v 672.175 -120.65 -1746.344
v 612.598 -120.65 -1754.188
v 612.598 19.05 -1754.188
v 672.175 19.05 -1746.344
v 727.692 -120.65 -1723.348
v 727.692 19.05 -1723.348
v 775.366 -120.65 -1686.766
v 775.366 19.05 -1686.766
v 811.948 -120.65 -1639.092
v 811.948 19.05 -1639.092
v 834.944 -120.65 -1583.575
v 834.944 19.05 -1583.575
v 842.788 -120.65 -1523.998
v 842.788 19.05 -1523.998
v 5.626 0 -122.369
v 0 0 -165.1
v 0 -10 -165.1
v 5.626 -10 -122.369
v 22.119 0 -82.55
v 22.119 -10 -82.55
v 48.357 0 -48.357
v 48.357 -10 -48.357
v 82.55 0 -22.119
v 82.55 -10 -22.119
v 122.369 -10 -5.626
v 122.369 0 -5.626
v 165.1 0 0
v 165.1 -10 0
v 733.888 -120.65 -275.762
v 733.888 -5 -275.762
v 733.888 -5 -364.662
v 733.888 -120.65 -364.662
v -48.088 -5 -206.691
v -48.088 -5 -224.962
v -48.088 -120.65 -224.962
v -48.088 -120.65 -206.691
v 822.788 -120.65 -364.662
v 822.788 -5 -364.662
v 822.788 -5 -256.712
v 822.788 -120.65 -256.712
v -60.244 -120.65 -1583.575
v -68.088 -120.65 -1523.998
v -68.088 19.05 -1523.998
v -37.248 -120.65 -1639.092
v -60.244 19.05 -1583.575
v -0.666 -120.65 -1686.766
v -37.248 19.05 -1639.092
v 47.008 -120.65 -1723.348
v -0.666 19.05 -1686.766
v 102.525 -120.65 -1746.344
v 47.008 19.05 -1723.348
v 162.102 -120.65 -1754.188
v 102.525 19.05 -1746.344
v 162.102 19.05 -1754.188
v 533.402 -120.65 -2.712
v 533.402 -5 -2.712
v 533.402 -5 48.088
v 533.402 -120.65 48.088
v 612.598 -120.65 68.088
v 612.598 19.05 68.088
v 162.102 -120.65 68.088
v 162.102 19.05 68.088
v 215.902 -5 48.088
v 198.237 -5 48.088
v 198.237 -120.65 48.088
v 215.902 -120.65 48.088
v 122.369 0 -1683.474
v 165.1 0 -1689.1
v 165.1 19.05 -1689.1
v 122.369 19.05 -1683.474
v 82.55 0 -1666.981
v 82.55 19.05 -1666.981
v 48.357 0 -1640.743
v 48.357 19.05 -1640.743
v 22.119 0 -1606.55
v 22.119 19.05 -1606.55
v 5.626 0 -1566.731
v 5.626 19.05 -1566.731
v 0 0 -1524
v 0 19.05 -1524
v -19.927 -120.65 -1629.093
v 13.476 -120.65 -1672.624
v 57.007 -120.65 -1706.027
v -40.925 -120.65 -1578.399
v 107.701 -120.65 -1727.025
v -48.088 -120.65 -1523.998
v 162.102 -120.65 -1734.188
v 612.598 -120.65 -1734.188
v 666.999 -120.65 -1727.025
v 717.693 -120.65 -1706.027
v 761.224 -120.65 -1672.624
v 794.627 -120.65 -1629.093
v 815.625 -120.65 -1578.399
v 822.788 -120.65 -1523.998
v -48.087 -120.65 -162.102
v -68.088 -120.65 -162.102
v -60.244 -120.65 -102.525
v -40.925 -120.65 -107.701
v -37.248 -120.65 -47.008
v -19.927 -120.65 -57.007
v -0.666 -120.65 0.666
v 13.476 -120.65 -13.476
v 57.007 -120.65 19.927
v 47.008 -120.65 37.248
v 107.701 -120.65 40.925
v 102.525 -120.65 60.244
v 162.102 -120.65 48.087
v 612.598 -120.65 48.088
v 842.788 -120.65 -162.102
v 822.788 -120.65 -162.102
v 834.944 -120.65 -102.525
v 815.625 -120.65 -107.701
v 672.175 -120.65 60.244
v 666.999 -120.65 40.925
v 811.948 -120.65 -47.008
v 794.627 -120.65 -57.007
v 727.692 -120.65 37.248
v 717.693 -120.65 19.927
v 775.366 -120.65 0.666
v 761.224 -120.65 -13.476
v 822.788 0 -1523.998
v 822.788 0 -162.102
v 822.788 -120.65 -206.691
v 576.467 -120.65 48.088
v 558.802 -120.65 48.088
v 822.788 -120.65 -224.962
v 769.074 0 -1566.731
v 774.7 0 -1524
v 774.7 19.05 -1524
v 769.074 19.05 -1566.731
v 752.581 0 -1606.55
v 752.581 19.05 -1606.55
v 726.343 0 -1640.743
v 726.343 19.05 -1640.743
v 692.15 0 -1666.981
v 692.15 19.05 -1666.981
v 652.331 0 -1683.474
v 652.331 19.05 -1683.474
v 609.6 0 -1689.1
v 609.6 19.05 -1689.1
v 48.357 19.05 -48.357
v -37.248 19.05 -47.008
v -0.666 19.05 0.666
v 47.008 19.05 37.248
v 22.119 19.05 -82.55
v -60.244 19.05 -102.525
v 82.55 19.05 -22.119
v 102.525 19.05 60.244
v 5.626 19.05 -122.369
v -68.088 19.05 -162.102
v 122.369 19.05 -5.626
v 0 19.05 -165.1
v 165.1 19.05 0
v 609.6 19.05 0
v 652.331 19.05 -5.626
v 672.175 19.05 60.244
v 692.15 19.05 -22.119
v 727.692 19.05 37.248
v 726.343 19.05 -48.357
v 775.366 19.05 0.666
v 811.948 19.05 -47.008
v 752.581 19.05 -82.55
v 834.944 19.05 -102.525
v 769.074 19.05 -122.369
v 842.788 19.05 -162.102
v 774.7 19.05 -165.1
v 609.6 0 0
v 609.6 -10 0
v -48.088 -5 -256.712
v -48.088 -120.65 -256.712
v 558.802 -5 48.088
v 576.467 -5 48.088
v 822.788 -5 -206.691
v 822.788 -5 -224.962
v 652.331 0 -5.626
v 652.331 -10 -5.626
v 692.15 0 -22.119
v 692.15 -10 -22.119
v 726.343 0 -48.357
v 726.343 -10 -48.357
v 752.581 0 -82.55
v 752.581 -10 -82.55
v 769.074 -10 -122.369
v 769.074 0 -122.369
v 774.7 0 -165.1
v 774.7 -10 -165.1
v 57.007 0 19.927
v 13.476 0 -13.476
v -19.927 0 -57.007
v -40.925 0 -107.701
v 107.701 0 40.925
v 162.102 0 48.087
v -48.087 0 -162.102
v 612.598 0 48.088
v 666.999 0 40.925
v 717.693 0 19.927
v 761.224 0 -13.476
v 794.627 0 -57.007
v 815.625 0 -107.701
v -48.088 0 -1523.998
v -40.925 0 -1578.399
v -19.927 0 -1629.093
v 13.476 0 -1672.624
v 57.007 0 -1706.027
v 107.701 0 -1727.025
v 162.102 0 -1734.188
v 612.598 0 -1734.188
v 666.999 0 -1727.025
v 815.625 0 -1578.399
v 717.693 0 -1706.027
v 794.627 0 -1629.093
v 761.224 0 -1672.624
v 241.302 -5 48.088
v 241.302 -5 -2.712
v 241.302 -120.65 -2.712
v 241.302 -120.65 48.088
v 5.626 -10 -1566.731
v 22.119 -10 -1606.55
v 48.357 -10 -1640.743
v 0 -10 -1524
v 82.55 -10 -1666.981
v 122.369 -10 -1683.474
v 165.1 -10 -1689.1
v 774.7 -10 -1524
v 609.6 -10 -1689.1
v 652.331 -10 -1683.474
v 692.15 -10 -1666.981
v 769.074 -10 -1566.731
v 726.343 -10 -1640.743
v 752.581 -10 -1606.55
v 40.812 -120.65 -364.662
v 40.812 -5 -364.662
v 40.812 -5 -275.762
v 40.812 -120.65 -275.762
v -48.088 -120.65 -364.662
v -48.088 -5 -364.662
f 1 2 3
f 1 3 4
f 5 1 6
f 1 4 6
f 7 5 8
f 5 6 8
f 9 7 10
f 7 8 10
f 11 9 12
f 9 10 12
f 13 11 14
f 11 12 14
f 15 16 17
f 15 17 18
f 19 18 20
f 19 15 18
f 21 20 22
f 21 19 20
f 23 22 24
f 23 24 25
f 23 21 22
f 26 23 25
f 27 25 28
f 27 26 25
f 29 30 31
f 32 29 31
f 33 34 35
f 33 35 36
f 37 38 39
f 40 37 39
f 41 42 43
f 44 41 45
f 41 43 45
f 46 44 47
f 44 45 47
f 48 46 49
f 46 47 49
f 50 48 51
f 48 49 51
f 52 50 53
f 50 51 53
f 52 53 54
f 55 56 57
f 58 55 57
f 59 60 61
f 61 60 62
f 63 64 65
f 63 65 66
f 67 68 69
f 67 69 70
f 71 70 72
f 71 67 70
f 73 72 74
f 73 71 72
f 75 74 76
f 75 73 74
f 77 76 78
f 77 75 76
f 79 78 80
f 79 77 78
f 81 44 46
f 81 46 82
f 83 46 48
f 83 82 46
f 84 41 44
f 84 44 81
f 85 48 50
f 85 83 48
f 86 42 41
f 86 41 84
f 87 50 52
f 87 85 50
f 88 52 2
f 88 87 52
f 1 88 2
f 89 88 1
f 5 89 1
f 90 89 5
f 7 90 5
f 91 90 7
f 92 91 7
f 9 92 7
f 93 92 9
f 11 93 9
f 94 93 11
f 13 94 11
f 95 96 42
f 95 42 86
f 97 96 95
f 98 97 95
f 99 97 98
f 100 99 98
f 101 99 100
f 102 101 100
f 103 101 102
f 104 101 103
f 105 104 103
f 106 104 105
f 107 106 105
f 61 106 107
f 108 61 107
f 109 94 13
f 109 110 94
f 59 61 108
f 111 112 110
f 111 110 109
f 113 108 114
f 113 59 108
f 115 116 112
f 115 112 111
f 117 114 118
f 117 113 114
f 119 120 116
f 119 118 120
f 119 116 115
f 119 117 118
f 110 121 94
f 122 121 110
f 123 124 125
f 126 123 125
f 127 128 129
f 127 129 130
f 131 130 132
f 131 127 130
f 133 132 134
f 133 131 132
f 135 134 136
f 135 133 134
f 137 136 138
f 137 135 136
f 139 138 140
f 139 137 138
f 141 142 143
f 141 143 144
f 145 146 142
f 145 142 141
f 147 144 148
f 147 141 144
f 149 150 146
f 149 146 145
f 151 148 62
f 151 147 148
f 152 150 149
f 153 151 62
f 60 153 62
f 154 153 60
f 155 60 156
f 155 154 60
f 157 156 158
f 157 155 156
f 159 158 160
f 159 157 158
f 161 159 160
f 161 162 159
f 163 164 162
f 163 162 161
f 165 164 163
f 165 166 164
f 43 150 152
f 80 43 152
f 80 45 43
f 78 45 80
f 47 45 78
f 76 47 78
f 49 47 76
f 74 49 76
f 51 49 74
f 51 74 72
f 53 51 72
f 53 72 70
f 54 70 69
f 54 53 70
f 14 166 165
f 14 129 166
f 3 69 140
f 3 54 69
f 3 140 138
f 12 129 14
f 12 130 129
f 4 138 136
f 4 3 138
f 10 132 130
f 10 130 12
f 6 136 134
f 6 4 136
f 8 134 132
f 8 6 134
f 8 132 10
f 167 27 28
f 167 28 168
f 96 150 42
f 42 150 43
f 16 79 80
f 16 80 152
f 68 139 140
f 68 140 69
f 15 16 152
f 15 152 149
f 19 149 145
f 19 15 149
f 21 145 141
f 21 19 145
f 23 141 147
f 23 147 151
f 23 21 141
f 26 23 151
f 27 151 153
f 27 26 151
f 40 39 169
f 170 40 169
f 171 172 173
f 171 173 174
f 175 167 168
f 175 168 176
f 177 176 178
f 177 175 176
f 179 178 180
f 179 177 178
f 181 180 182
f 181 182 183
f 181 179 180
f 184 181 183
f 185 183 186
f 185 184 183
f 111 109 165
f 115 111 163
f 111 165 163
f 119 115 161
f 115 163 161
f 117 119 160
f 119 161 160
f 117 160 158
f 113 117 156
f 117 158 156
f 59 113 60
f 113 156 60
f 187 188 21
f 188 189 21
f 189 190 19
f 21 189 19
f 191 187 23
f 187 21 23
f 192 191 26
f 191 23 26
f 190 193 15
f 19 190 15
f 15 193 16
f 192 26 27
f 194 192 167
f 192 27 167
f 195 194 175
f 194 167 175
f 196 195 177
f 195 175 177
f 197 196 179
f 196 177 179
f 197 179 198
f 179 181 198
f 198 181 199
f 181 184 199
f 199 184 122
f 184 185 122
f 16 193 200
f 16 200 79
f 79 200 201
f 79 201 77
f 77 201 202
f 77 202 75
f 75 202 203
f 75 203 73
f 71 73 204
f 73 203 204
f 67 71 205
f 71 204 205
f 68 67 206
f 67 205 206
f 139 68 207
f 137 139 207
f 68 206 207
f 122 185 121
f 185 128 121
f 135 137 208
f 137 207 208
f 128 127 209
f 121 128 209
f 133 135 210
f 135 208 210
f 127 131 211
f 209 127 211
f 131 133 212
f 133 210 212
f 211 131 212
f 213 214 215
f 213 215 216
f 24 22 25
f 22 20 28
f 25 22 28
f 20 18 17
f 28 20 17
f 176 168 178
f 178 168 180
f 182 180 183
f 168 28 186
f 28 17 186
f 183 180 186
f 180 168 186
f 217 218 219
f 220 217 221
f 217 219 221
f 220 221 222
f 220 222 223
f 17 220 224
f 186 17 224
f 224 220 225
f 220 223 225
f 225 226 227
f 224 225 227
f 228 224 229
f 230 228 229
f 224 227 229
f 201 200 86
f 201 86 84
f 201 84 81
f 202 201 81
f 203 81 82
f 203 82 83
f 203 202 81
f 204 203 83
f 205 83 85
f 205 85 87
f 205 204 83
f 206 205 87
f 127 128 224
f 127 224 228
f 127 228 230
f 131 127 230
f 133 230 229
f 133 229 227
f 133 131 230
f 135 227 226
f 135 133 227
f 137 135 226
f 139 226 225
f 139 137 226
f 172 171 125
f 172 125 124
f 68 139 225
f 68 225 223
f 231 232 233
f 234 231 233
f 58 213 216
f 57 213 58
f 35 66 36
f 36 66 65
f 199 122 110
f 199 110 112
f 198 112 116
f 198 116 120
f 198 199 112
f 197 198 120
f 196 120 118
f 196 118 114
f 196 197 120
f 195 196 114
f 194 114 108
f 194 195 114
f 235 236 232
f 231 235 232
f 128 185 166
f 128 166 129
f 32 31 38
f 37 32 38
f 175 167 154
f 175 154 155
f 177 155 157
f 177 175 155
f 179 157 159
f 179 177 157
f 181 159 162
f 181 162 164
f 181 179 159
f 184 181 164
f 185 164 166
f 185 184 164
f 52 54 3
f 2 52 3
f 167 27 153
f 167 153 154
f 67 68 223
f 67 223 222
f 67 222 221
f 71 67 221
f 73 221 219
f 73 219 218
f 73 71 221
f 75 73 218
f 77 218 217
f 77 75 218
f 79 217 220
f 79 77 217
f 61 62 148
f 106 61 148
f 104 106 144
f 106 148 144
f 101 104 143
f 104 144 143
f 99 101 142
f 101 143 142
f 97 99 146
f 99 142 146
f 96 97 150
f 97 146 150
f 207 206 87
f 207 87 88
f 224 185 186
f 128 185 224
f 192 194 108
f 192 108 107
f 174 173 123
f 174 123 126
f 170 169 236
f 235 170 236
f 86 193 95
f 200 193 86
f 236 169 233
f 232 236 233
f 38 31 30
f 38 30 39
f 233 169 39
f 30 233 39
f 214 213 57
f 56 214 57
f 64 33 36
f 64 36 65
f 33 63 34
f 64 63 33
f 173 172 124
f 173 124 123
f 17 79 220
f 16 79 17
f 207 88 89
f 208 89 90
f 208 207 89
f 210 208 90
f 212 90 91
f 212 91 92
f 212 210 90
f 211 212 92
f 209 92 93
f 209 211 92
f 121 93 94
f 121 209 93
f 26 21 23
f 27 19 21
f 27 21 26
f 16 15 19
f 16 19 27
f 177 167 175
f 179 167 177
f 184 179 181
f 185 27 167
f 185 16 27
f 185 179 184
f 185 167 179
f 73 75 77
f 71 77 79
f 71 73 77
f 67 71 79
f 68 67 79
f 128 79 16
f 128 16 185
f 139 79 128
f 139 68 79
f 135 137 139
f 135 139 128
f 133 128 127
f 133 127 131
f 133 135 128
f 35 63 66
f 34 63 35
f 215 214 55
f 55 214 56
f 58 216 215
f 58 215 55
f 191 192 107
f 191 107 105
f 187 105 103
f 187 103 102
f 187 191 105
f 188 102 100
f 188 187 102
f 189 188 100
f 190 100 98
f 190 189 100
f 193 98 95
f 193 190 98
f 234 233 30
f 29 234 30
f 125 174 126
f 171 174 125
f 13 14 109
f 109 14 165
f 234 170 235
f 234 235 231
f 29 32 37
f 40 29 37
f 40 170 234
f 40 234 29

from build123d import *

# Parameters (mm, degrees)
BOSS_EXTRUDE2_DEPTH   = 10
BOSS_EXTRUDE3_DEPTH   = 19.05
BOSS_EXTRUDE4_DEPTH   = 120.65
BOSS_EXTRUDE7_START   = 5
SKETCH4_W             = 292.1
SKETCH4_H             = 50.8
BOSS_EXTRUDE7_DEPTH   = 115.65
BOSS_EXTRUDE7_2_DEPTH = 115.65
BOSS_EXTRUDE7_3_DEPTH = 115.65
BOSS_EXTRUDE7_4_DEPTH = 115.65


with BuildPart() as part:
    # Sketch1 → Boss-Extrude2 (new body)
    with BuildSketch(Plane(origin=(0, 0, 0), x_dir=(1, 0, 0), z_dir=(0, 1, 0))):
        with BuildLine():
            Line((165.1, 0), (609.6, 0))
            ThreePointArc((609.6, 0), (726.343329574, 48.356670426), (774.7, 165.1))
            Line((774.7, 165.1), (774.7, 1524))
            ThreePointArc((774.7, 1524), (726.343329574, 1640.743329574), (609.6, 1689.1))
            Line((609.6, 1689.1), (165.1, 1689.1))
            ThreePointArc((165.1, 1689.1), (48.356670426, 1640.743329574), (0, 1524))
            Line((0, 1524), (0, 165.1))
            ThreePointArc((0, 165.1), (48.356670426, 48.356670426), (165.1, 0))
        make_face()
    extrude(amount=-BOSS_EXTRUDE2_DEPTH)


with BuildPart() as body_2:
    # Sketch2 → Boss-Extrude3 (new body)
    with BuildSketch(Plane(origin=(0, 0, 0), x_dir=(1, 0, 0), z_dir=(0, 1, 0))):
        with BuildLine():
            Line((162.1025, -68.0875), (612.5975, -68.0875))
            ThreePointArc((612.5975, -68.0875), (775.366409961, -0.666409961), (842.7875, 162.1025))
            Line((842.7875, 162.1025), (842.7875, 1523.9975))
            ThreePointArc((842.7875, 1523.9975), (775.366409961, 1686.766409961), (612.5975, 1754.1875))
            Line((612.5975, 1754.1875), (162.1025, 1754.1875))
            ThreePointArc((162.1025, 1754.1875), (-0.666409961, 1686.766409961), (-68.0875, 1523.9975))
            Line((-68.0875, 1523.9975), (-68.0875, 162.1025))
            ThreePointArc((-68.0875, 162.1025), (-0.666409961, -0.666409961), (162.1025, -68.0875))
        make_face()
        with BuildLine():
            Line((165.1, 0), (609.6, 0))
            ThreePointArc((609.6, 0), (726.343329574, 48.356670426), (774.7, 165.1))
            Line((774.7, 165.1), (774.7, 1524))
            ThreePointArc((774.7, 1524), (726.343329574, 1640.743329574), (609.6, 1689.1))
            Line((609.6, 1689.1), (165.1, 1689.1))
            ThreePointArc((165.1, 1689.1), (48.356670426, 1640.743329574), (0, 1524))
            Line((0, 1524), (0, 165.1))
            ThreePointArc((0, 165.1), (48.356670426, 48.356670426), (165.1, 0))
        make_face(mode=Mode.SUBTRACT)
    extrude(amount=BOSS_EXTRUDE3_DEPTH)

    # Sketch3 → Boss-Extrude4 (add)
    with BuildSketch(Plane.XZ):
        with BuildLine():
            Line((162.1025, -1754.1875), (612.5975, -1754.1875))
            ThreePointArc((612.5975, -1754.1875), (775.366409961, -1686.766409961), (842.7875, -1523.9975))
            Line((842.7875, -1523.9975), (842.7875, -162.1025))
            ThreePointArc((842.7875, -162.1025), (775.366409961, 0.666409961), (612.5975, 68.0875))
            Line((612.5975, 68.0875), (162.1025, 68.0875))
            ThreePointArc((162.1025, 68.0875), (-0.666409961, 0.666409961), (-68.0875, -162.1025))
            Line((-68.0875, -162.1025), (-68.0875, -1523.9975))
            ThreePointArc((-68.0875, -1523.9975), (-0.666409961, -1686.766409961), (162.1025, -1754.1875))
        make_face()
        with BuildLine():
            Line((162.1025, -1734.1875), (612.5975, -1734.1875))
            ThreePointArc((612.5975, -1734.1875), (761.224274338, -1672.624274338), (822.7875, -1523.9975))
            Line((822.7875, -1523.9975), (822.7875, -162.1025))
            ThreePointArc((822.7875, -162.1025), (761.224274338, -13.475725662), (612.5975, 48.0875))
            Line((612.5975, 48.0875), (162.1025, 48.0875))
            ThreePointArc((162.1025, 48.0875), (13.475725662, -13.475725662), (-48.0875, -162.1025))
            Line((-48.0875, -162.1025), (-48.0875, -1523.9975))
            ThreePointArc((-48.0875, -1523.9975), (13.475725662, -1672.624274338), (162.1025, -1734.1875))
        make_face(mode=Mode.SUBTRACT)
    extrude(amount=BOSS_EXTRUDE4_DEPTH)


with BuildPart() as body_3:
    # Sketch4 → Boss-Extrude7 (new body)
    with BuildSketch(Plane.XZ.offset(BOSS_EXTRUDE7_START)):
        with Locations((387.3525, 22.6875)):
            Rectangle(SKETCH4_W, SKETCH4_H)
    extrude(amount=BOSS_EXTRUDE7_DEPTH)


with BuildPart() as body_4:
    # Sketch4 → Boss-Extrude7 2 (new body)
    with BuildSketch(Plane.XZ.offset(BOSS_EXTRUDE7_START)):
        Polygon((822.7875, -256.7125), (-48.0875, -256.7125), (-48.0875, -275.7625), (-48.0875, -364.6625), (40.8125, -364.6625), (40.8125, -275.7625), (733.8875, -275.7625), (733.8875, -364.6625), (822.7875, -364.6625), (822.7875, -275.7625), align=None)
    extrude(amount=BOSS_EXTRUDE7_2_DEPTH)


with BuildPart() as body_5:
    # Sketch4 → Boss-Extrude7 3 (new body)
    with BuildSketch(Plane.XZ.offset(BOSS_EXTRUDE7_START)):
        Polygon((822.7875, -224.9625), (558.8025, 48.0875), (576.467392336, 48.0875), (822.7875, -206.691011649), align=None)
    extrude(amount=BOSS_EXTRUDE7_3_DEPTH)


with BuildPart() as body_6:
    # Sketch4 → Boss-Extrude7 4 (new body)
    with BuildSketch(Plane.XZ.offset(BOSS_EXTRUDE7_START)):
        Polygon((215.9025, 48.0875), (-48.0875, -224.9625), (-48.0875, -206.69119052), (198.237446018, 48.0875), align=None)
    extrude(amount=BOSS_EXTRUDE7_4_DEPTH)


solid = Compound([part.part, body_2.part, body_3.part, body_4.part, body_5.part, body_6.part])
